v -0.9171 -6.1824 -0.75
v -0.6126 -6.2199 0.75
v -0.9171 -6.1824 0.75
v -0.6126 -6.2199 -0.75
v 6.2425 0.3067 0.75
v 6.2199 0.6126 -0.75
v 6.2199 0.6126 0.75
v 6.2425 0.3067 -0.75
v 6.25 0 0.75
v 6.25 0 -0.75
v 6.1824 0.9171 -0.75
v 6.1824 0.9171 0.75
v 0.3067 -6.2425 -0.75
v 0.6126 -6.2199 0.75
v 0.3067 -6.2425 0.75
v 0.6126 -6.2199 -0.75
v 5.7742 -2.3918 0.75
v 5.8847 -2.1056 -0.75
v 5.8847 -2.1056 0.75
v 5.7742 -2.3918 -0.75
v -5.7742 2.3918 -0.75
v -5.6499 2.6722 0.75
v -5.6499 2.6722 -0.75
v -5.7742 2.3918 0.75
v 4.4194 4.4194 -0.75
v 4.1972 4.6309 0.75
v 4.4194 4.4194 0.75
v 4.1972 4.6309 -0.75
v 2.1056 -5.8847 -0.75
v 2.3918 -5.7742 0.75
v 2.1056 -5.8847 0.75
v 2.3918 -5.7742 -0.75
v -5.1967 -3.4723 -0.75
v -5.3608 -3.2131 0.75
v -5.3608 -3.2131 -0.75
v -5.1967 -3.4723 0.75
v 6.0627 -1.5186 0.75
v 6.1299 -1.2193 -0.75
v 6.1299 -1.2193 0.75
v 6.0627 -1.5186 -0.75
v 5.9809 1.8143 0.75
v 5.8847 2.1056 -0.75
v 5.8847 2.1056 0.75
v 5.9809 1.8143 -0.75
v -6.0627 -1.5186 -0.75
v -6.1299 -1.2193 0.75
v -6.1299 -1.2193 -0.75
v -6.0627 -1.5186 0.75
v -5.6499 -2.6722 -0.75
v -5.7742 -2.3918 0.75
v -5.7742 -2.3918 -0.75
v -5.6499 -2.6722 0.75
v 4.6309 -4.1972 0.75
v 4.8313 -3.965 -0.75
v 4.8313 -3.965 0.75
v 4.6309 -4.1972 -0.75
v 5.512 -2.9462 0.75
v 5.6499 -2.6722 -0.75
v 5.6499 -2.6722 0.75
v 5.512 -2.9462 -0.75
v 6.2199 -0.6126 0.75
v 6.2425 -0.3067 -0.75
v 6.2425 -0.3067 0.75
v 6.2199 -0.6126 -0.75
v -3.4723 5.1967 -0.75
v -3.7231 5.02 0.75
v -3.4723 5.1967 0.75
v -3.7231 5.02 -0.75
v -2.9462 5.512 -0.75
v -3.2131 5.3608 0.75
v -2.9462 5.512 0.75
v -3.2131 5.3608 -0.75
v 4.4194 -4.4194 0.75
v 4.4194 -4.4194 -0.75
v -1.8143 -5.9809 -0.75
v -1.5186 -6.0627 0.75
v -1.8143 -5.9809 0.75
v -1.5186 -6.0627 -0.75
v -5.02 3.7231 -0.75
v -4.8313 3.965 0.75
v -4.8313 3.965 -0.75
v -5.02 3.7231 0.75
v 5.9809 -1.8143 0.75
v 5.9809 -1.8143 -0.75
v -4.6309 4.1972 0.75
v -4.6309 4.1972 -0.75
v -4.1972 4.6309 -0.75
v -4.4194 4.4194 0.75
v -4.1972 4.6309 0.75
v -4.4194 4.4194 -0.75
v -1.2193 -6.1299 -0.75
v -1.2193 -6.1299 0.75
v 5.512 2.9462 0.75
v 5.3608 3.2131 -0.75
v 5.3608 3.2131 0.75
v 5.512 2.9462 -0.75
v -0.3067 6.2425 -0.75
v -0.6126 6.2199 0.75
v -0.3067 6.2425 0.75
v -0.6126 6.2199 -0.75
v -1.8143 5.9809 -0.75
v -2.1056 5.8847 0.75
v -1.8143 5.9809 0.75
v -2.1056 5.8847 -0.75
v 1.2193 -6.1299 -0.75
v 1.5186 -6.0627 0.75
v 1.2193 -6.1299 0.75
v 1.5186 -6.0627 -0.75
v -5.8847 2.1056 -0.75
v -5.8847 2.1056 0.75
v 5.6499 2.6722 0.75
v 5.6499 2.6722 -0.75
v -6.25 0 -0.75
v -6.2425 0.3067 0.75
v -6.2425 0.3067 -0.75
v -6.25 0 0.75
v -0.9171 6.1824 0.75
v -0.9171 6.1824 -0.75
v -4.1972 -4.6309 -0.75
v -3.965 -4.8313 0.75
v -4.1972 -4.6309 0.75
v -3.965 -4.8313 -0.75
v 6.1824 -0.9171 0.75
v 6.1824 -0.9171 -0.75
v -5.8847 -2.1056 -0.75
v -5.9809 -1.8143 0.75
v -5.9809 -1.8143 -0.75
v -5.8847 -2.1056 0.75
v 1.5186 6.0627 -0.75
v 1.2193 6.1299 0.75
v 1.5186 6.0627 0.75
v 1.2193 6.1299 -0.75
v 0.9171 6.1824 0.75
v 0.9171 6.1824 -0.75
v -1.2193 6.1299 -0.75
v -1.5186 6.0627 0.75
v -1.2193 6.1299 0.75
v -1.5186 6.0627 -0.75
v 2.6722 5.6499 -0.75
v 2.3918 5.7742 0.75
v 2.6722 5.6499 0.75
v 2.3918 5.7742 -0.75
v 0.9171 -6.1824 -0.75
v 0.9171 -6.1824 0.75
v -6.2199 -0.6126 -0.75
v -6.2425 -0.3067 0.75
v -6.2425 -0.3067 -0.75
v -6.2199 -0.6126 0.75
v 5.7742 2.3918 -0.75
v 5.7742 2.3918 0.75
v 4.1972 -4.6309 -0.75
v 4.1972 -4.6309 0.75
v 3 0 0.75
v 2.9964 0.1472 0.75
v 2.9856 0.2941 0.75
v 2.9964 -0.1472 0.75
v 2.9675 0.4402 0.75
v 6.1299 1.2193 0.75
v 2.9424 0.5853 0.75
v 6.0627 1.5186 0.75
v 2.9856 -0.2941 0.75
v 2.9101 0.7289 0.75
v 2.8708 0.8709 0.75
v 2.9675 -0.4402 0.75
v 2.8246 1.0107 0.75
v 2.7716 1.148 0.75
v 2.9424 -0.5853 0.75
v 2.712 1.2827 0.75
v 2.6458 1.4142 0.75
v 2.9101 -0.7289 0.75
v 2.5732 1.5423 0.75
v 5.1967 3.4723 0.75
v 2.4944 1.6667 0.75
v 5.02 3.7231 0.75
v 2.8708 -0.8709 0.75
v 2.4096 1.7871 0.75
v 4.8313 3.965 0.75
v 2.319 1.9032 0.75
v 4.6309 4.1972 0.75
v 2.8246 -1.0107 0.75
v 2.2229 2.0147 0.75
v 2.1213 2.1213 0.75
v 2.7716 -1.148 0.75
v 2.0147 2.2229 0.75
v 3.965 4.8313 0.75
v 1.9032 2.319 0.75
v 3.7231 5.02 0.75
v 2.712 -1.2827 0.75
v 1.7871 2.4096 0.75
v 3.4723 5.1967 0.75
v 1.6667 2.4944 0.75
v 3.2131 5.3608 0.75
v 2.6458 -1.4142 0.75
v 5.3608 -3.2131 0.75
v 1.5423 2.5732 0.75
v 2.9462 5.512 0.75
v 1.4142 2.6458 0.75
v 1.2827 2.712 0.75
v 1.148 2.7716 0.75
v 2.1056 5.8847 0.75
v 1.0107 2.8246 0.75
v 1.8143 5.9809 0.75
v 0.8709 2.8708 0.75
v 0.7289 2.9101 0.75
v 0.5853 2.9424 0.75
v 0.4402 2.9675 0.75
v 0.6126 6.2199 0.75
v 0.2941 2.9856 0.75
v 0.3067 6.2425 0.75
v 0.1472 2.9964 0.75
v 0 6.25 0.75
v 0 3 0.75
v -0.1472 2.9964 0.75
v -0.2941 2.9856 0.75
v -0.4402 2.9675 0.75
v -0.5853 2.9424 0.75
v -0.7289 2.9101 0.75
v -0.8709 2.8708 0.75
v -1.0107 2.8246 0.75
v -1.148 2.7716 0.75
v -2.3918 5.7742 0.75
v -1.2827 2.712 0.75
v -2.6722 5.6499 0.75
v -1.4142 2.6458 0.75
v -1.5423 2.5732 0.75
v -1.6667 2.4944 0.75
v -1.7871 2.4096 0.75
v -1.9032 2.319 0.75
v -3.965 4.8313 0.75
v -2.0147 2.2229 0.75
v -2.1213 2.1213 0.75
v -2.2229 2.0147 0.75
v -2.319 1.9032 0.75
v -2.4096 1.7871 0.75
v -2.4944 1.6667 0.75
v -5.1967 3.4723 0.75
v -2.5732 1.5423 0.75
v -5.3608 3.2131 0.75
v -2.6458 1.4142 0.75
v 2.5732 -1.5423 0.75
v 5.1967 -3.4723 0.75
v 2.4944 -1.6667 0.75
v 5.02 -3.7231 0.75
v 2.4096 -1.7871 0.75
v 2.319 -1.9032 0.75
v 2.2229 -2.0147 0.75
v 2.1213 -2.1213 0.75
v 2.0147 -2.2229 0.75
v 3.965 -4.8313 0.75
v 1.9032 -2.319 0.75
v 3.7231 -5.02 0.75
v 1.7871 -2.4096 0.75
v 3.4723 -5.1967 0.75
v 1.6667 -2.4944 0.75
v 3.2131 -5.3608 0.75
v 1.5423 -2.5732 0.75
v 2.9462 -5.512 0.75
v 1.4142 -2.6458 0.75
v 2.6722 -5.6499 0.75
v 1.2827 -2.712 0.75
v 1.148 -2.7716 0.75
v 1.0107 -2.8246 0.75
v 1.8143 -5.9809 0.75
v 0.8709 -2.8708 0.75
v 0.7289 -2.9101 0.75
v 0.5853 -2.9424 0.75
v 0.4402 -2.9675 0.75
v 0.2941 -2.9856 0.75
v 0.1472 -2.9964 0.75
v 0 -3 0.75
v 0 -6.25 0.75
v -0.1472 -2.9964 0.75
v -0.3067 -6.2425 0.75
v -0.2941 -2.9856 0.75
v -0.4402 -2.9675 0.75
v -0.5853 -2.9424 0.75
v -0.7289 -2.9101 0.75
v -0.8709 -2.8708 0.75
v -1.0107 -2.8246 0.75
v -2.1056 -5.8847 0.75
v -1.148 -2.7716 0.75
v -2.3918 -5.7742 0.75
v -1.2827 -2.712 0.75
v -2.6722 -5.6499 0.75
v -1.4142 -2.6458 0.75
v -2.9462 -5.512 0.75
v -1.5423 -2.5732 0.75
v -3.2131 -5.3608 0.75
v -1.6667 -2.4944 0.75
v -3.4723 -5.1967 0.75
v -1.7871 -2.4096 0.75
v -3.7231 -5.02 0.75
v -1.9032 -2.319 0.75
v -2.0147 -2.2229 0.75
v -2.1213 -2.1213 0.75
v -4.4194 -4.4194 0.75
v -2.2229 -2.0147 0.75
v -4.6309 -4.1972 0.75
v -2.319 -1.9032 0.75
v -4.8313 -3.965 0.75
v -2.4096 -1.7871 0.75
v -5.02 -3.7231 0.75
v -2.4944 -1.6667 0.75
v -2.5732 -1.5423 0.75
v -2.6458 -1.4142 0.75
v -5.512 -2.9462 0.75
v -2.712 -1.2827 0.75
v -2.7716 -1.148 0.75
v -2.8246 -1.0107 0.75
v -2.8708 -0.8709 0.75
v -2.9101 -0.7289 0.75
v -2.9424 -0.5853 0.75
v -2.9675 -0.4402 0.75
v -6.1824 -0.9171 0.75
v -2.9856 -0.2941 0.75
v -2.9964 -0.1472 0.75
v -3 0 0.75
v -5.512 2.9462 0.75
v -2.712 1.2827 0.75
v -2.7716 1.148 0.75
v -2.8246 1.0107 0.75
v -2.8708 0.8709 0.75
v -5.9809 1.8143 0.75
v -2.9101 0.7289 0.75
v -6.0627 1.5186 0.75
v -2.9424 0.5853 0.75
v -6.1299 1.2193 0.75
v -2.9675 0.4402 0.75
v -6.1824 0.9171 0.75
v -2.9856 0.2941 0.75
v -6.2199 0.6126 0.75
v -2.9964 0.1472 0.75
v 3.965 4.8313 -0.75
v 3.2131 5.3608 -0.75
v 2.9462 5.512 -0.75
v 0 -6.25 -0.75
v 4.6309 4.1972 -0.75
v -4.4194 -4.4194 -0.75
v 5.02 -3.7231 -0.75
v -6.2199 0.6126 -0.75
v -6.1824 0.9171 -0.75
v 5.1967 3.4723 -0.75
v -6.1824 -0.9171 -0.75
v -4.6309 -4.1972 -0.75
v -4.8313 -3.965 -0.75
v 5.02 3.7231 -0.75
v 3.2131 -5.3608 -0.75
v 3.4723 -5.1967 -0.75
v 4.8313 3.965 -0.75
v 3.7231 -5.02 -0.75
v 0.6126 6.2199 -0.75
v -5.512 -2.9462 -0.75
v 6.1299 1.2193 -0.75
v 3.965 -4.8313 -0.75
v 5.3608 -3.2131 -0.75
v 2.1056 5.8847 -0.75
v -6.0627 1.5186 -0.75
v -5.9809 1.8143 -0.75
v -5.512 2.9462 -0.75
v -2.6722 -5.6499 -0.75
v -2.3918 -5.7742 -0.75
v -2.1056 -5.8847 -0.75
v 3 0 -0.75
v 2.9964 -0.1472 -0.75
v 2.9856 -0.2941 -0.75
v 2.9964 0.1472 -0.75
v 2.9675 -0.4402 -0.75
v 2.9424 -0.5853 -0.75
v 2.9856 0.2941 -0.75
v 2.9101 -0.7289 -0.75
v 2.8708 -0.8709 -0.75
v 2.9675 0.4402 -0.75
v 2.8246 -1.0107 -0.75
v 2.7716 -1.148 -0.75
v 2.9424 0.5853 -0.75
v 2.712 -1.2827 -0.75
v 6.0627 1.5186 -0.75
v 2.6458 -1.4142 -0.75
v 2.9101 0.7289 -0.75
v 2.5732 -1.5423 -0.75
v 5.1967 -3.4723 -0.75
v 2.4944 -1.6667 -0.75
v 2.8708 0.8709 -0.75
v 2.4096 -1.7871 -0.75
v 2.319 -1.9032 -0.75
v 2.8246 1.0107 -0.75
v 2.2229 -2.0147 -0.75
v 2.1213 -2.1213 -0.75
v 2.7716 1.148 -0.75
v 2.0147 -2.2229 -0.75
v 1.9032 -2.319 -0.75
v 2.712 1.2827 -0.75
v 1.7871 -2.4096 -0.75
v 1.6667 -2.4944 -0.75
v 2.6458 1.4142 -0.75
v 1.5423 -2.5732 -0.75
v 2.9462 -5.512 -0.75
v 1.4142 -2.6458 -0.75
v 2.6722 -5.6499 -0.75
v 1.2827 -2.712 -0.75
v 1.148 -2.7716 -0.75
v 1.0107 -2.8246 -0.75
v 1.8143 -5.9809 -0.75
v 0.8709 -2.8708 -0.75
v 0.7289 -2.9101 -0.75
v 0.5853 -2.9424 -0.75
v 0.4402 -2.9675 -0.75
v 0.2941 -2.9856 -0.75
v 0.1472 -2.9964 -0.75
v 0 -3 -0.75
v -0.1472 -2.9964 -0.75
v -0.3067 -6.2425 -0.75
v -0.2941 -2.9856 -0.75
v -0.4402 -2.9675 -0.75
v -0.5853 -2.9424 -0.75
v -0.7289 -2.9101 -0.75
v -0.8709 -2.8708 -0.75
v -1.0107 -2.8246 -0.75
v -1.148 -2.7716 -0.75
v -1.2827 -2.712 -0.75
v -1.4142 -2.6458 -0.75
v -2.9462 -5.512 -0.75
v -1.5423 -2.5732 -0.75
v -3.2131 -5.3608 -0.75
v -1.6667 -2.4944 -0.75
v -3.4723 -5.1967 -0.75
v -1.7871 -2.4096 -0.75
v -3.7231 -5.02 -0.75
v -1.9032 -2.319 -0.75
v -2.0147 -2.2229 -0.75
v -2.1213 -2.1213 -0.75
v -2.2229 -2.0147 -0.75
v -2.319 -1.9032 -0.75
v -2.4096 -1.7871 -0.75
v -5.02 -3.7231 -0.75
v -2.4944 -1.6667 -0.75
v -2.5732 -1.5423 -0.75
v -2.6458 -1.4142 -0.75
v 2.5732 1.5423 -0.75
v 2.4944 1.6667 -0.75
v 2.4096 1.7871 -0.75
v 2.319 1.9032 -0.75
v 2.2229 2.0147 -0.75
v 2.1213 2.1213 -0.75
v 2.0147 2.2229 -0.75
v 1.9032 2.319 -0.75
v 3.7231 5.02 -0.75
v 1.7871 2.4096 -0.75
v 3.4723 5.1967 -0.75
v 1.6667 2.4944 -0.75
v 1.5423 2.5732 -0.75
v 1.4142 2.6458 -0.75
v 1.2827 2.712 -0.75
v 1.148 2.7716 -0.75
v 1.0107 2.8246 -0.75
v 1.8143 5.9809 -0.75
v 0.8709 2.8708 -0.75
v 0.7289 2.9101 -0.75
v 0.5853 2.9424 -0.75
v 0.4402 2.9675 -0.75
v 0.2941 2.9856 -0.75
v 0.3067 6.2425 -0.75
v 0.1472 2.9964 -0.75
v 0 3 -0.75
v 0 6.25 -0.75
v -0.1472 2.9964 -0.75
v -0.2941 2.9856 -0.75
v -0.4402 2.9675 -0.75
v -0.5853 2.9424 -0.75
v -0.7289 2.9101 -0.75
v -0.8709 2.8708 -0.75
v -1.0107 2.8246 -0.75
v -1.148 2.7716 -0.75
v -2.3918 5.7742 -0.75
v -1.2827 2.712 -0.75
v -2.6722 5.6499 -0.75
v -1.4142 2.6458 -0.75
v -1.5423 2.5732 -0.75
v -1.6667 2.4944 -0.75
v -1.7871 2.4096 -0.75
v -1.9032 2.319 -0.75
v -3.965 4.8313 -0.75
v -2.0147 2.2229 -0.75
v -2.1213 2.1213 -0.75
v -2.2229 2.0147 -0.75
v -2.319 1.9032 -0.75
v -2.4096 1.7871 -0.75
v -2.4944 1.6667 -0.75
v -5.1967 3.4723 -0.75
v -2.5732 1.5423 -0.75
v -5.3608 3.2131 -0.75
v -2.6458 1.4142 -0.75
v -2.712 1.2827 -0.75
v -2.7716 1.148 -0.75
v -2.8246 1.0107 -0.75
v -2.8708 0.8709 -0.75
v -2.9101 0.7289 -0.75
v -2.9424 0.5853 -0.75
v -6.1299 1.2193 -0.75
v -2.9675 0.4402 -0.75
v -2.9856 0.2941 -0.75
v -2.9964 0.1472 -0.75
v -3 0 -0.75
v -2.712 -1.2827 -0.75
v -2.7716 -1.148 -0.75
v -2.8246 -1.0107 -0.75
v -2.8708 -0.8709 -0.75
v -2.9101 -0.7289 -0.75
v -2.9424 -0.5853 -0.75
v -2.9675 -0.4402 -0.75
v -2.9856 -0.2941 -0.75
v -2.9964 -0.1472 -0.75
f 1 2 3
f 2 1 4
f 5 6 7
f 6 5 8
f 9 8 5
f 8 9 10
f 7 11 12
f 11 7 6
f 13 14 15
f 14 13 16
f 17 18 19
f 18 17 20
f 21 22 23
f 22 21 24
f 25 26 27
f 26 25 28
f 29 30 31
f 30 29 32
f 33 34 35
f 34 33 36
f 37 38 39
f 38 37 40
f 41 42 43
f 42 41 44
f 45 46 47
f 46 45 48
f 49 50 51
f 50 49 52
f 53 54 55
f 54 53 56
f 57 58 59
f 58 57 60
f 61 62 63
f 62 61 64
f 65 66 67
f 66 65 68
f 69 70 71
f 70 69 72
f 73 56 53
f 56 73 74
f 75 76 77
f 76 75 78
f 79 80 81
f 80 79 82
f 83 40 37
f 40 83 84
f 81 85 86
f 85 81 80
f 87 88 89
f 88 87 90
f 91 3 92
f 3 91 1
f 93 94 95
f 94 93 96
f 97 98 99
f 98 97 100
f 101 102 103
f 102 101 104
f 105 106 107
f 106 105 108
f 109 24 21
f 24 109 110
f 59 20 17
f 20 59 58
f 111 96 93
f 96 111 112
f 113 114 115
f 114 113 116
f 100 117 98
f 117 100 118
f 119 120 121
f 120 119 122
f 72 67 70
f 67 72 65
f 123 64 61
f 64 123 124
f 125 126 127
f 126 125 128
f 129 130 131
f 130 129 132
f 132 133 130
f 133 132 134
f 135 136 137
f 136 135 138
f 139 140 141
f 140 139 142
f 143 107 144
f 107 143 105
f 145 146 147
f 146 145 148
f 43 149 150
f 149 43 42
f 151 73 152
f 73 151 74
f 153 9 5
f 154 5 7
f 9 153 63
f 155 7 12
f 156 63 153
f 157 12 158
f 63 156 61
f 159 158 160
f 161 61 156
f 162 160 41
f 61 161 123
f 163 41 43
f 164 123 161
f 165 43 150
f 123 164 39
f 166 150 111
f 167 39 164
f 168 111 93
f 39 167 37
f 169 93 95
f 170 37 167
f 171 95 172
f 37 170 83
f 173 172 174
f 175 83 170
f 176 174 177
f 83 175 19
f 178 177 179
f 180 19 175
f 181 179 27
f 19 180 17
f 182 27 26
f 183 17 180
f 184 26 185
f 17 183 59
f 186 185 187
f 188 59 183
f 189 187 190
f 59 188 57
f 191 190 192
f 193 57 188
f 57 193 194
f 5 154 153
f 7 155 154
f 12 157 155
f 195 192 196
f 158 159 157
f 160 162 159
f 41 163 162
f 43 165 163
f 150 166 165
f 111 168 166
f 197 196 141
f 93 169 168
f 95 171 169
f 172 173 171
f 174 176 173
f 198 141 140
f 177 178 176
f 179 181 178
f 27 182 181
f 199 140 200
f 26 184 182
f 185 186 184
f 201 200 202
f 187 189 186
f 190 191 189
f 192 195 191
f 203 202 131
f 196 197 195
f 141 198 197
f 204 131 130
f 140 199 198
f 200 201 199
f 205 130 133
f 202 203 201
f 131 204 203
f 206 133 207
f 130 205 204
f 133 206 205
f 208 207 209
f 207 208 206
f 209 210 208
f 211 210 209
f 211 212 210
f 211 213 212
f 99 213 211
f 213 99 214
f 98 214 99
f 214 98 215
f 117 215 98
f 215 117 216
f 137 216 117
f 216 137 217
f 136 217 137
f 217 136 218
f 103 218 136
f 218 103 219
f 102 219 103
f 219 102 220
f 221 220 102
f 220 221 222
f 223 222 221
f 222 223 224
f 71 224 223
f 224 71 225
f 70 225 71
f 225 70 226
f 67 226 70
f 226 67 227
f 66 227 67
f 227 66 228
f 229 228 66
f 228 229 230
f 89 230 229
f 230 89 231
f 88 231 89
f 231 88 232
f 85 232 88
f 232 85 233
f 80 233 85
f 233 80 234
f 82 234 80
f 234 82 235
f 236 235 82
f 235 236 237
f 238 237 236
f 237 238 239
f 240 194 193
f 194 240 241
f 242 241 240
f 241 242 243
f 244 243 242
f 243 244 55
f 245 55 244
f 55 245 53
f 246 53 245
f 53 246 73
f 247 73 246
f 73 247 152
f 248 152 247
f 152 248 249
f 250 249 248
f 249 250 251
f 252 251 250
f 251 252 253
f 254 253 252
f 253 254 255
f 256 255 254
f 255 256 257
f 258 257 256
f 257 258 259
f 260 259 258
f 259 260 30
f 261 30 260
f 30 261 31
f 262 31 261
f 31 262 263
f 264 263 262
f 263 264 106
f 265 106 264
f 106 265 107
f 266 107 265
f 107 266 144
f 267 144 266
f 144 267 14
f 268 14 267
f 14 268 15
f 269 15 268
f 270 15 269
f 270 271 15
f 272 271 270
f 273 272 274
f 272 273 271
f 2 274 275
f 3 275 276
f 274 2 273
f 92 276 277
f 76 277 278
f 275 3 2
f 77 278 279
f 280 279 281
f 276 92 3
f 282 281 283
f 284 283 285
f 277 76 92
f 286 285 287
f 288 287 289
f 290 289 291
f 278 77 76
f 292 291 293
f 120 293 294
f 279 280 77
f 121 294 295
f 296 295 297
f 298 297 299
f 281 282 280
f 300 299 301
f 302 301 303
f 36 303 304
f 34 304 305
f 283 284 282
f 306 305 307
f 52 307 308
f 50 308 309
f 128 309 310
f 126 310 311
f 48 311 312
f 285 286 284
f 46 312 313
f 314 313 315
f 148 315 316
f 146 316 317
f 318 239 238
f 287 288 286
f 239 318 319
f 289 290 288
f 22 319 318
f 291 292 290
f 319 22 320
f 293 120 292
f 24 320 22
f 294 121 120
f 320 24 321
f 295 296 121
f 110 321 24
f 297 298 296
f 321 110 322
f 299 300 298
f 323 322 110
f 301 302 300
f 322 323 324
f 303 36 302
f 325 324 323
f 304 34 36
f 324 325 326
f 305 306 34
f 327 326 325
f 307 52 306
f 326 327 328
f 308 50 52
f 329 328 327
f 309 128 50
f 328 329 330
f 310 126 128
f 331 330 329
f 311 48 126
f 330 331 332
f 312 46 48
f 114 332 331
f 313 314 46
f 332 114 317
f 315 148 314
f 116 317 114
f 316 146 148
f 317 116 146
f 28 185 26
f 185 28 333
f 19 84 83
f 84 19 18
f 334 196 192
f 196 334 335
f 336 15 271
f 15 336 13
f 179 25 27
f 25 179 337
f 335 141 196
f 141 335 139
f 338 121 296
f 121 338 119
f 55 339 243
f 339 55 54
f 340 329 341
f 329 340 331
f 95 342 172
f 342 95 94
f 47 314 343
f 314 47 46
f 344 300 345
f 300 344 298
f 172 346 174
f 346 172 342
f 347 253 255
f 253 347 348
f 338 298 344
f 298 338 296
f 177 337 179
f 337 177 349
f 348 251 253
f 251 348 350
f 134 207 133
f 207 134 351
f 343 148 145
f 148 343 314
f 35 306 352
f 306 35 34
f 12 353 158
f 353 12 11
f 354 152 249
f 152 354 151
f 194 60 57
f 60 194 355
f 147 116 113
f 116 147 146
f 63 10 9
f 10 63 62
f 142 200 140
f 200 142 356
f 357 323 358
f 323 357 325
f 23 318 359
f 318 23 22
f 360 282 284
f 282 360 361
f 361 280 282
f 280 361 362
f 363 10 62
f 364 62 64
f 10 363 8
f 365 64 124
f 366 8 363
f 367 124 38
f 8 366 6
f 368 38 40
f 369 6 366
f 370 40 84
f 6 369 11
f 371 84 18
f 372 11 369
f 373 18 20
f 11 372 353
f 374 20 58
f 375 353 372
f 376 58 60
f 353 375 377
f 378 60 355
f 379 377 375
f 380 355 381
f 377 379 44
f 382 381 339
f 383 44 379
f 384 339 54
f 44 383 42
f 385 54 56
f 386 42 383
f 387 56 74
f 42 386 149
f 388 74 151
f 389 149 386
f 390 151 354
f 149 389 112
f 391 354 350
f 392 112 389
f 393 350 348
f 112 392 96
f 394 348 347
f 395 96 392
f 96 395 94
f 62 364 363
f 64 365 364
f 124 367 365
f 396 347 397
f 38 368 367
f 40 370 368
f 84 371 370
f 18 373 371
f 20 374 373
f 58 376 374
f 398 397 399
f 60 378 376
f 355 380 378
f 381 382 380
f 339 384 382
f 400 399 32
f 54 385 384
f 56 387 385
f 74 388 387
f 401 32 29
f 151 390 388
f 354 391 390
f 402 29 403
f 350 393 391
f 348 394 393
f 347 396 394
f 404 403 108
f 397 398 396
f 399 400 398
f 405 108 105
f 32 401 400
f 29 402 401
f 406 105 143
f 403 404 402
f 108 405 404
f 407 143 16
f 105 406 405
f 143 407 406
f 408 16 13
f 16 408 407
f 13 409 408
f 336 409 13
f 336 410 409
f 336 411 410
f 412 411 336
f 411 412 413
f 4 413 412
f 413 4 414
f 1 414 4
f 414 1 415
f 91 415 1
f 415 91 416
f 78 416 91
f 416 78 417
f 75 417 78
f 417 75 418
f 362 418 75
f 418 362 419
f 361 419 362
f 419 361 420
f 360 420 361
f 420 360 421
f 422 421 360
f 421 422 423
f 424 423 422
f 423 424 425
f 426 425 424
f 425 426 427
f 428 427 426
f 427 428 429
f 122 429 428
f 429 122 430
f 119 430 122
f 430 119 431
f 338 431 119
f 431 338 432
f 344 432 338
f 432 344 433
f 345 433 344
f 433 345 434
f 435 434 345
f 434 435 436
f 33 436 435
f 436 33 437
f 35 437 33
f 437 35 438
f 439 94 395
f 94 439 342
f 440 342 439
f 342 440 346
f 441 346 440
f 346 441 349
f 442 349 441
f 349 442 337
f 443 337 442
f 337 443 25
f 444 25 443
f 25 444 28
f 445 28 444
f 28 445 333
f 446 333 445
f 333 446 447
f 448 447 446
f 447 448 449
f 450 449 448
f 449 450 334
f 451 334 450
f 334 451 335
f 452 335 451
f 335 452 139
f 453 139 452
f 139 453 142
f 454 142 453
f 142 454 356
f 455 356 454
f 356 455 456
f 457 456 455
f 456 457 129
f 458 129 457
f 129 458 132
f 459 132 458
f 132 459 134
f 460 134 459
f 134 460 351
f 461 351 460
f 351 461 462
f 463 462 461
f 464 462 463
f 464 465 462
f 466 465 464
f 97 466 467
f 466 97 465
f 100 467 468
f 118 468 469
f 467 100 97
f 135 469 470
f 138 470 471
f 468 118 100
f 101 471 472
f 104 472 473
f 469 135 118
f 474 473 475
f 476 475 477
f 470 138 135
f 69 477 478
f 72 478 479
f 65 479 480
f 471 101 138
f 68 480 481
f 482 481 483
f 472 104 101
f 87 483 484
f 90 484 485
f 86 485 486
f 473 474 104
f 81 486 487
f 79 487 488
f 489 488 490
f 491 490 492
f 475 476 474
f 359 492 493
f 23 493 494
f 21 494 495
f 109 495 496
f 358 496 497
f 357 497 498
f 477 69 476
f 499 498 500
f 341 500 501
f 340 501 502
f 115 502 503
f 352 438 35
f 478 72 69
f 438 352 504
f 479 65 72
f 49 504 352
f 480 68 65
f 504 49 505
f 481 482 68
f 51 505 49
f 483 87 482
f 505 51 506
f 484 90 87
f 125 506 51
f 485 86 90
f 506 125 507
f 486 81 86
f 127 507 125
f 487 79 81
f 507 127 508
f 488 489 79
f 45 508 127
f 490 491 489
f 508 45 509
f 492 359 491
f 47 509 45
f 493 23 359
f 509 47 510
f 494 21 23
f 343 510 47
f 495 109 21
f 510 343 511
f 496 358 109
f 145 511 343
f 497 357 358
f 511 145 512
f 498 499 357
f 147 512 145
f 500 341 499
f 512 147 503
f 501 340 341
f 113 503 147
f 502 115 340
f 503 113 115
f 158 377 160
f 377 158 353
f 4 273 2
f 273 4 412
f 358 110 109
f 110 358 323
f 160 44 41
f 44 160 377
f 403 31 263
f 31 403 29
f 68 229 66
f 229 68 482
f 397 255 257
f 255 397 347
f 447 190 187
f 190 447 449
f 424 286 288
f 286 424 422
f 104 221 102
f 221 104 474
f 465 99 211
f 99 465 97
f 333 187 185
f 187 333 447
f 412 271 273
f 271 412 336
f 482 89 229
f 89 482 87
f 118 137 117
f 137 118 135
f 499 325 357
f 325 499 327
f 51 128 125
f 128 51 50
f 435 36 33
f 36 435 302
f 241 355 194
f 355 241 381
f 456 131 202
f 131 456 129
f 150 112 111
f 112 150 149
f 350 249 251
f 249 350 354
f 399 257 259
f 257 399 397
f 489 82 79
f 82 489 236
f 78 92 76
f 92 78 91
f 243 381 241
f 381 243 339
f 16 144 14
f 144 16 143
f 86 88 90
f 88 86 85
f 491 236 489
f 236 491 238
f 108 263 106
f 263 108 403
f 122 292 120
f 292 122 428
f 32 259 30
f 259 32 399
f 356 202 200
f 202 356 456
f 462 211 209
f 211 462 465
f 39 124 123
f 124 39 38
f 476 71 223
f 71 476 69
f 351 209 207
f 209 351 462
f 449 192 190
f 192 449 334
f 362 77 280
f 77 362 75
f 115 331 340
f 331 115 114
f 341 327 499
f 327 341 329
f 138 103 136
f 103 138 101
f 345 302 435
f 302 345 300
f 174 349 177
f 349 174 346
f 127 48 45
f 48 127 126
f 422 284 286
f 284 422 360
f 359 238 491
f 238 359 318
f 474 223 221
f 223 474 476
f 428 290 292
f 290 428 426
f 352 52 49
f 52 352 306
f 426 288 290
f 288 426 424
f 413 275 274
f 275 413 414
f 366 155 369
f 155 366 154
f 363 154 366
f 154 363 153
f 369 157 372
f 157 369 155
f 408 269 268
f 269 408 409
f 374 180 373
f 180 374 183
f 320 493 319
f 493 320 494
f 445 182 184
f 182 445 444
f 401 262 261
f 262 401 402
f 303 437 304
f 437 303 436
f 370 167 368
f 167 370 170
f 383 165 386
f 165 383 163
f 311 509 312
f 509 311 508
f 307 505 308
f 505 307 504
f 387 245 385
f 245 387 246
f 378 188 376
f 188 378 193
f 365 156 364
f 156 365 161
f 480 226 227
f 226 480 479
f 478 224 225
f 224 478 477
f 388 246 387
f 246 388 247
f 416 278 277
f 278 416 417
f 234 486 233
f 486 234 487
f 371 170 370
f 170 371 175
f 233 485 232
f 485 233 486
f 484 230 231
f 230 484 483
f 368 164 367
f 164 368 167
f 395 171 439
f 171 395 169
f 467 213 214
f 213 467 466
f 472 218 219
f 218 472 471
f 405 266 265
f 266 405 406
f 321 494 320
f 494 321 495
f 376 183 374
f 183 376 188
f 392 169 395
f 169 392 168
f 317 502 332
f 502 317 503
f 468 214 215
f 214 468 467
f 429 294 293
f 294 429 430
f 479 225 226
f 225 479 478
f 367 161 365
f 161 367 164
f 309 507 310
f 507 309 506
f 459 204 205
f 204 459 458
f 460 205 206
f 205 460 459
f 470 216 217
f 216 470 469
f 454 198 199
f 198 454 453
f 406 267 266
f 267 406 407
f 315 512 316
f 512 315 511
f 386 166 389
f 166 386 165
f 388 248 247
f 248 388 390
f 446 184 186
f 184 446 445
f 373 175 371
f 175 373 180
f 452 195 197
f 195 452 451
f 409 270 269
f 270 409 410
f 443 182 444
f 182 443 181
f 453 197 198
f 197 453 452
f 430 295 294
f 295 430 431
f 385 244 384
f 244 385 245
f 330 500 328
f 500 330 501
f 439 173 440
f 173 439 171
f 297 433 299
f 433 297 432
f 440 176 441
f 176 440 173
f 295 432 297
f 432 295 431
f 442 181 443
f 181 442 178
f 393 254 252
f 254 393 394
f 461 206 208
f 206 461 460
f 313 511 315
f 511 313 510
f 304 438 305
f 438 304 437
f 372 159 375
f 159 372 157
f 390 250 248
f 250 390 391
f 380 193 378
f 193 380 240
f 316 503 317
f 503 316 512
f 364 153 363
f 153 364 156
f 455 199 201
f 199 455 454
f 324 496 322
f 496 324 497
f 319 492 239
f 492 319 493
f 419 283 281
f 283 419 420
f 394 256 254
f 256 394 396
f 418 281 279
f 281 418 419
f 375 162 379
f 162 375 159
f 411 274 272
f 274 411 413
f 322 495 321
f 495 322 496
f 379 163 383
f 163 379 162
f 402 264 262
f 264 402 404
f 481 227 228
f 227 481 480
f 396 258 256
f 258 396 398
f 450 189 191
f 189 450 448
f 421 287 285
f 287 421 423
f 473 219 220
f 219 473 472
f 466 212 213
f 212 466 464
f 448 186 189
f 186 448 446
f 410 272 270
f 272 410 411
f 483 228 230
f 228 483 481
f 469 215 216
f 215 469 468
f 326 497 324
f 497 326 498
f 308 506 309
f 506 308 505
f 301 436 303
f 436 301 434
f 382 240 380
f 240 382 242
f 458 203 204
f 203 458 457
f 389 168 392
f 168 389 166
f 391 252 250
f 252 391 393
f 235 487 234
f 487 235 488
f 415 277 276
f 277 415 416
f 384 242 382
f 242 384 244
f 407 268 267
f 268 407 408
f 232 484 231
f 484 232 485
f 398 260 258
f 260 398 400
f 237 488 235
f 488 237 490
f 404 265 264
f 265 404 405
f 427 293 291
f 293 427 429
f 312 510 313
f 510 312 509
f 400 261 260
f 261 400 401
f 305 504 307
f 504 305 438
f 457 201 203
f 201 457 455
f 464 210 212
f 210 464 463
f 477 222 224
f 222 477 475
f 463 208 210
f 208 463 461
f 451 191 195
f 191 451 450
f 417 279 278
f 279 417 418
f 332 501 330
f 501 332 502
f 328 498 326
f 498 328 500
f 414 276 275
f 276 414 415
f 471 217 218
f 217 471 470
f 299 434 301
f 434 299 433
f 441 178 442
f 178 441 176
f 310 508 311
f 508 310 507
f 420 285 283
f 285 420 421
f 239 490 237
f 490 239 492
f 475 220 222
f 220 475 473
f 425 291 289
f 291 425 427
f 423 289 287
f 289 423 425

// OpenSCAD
// Flat washer: 6.0mm ID, 12.5mm OD, 1.5mm thickness

inner_diameter_mm = 6.0;
outer_diameter_mm = 12.5;
thickness_mm      = 1.5;

$fn = 128;

module washer(id, od, t) {
    difference() {
        cylinder(d=od, h=t, center=true);
        // Make the cut slightly taller to guarantee a clean through-hole
        cylinder(d=id, h=t + 0.2, center=true);
    }
}

washer(inner_diameter_mm, outer_diameter_mm, thickness_mm);
